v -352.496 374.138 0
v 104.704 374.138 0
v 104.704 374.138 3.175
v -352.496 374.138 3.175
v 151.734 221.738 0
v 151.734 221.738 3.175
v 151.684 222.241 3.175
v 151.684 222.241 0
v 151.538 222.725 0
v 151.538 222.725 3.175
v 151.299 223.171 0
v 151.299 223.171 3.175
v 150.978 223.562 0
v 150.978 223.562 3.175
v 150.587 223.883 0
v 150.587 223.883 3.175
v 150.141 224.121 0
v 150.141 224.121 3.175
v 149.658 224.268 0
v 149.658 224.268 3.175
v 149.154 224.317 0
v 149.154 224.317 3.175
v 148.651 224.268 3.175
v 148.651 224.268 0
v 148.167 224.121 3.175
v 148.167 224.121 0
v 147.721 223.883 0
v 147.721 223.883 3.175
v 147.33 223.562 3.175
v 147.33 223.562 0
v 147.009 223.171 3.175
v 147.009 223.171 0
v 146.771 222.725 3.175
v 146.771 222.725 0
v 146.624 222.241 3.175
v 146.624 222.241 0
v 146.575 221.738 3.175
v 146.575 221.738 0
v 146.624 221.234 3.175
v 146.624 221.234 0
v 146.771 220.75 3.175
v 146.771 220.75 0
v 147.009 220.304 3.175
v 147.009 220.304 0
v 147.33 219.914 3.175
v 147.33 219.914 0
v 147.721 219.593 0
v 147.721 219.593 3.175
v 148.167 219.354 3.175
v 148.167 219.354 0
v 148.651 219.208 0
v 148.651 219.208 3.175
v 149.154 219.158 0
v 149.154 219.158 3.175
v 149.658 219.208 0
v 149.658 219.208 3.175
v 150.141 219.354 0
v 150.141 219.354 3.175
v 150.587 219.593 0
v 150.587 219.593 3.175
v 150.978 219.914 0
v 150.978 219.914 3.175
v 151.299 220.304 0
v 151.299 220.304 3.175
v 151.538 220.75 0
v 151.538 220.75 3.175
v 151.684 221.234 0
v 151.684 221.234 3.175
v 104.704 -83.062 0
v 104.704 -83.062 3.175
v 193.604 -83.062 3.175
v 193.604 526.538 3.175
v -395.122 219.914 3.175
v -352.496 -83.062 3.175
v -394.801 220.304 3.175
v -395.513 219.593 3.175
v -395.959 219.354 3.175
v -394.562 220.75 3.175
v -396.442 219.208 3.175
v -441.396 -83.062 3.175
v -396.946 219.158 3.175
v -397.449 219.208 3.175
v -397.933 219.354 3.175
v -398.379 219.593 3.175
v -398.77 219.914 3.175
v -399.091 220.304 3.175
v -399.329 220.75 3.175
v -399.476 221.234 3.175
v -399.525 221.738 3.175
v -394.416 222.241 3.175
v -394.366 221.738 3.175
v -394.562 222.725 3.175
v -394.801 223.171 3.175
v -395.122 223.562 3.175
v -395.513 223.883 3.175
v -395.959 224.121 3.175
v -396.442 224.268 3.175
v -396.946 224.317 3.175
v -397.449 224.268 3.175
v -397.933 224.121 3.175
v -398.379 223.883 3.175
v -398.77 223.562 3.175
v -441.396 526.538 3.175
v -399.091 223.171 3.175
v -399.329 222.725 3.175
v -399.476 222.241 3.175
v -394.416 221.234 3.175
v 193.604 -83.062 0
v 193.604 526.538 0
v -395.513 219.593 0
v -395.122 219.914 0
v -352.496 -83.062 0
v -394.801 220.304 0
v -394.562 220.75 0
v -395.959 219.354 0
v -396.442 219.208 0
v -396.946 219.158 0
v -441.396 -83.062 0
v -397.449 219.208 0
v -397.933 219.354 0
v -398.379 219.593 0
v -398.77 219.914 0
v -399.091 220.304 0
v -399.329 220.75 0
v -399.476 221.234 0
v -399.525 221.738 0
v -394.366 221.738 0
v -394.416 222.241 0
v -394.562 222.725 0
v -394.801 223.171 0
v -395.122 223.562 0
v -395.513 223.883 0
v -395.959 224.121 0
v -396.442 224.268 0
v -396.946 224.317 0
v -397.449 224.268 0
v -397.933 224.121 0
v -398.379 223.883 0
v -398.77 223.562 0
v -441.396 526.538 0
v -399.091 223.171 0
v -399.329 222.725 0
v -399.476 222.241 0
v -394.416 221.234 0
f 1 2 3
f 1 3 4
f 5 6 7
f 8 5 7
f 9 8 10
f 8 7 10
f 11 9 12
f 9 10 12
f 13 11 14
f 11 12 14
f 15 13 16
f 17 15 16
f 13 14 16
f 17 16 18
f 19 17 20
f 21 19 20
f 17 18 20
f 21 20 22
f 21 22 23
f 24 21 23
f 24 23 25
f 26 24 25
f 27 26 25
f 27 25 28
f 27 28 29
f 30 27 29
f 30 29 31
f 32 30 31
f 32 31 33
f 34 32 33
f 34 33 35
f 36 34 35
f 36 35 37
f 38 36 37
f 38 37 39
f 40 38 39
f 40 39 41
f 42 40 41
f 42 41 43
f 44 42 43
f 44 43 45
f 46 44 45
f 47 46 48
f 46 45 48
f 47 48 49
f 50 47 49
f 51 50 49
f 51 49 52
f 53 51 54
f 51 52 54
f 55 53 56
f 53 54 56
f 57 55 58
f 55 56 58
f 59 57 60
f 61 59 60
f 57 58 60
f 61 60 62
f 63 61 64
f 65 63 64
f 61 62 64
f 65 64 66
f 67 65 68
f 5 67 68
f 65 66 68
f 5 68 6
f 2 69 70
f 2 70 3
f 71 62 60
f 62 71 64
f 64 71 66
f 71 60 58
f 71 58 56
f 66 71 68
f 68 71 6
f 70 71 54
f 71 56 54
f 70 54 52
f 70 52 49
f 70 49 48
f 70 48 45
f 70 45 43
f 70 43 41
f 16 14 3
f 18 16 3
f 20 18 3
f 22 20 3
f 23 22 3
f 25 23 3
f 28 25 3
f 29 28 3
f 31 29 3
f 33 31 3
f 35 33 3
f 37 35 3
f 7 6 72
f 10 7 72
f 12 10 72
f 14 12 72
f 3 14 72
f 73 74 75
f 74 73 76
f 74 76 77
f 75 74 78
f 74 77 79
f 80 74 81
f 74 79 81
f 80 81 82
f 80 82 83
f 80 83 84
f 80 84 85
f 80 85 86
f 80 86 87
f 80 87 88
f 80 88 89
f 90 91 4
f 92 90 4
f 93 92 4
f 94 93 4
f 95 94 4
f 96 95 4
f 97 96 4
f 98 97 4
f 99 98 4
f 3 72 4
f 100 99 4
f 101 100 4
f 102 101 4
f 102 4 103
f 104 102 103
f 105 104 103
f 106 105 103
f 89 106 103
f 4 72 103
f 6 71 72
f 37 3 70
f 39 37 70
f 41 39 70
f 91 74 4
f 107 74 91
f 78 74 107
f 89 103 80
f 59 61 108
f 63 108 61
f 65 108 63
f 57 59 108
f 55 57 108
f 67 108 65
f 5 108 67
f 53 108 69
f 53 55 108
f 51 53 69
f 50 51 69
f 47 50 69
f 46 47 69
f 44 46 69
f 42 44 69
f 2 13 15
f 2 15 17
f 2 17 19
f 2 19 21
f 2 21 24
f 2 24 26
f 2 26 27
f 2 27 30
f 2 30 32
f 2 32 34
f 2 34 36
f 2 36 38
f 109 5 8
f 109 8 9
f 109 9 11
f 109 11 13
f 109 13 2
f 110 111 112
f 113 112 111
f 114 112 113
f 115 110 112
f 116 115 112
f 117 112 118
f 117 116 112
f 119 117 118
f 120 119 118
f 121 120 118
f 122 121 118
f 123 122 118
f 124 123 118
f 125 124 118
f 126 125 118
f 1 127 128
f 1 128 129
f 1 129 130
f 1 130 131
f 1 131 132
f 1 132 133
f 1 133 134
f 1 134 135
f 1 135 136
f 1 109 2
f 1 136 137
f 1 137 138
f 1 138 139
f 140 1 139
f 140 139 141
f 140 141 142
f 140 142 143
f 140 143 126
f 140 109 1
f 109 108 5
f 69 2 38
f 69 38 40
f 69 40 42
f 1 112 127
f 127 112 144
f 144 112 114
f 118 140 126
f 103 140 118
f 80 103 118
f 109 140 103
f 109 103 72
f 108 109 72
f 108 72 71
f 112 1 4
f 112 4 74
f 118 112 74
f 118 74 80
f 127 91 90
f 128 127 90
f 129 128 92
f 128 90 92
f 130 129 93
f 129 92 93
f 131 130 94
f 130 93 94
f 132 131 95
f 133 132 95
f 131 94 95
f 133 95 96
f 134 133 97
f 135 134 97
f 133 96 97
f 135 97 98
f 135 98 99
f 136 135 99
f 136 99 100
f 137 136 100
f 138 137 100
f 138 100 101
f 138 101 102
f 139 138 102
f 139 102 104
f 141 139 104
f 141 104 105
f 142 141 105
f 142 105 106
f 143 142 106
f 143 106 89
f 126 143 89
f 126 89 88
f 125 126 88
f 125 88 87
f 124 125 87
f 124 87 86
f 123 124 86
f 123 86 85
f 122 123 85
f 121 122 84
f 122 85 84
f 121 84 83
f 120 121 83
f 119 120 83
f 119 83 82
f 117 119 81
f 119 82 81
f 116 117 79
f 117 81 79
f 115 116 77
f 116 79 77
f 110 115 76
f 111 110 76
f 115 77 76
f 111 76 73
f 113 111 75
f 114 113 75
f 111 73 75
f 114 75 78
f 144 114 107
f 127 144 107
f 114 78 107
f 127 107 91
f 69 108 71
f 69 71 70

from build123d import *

# Parameters (mm, degrees)
BOSS_EXTRUDE1_DEPTH = 3.175
SKETCH2_R           = 2.5796875
CUT_EXTRUDE1_DEPTH  = 4.175


with BuildPart() as part:
    # Sketch1 → Boss-Extrude1 (new body)
    with BuildSketch(Plane.XY):
        Polygon((-441.3957506, 526.537652812), (193.6042494, 526.537652812), (193.6042494, -83.062347188), (104.7042494, -83.062347188), (104.7042494, 374.137652812), (-352.4957506, 374.137652812), (-352.4957506, -83.062347188), (-441.3957506, -83.062347188), (-441.3957506, 36.485330073), align=None)
    extrude(amount=BOSS_EXTRUDE1_DEPTH)

    # Sketch2 → Cut-Extrude1 (cut, through all)
    with BuildSketch(Plane.XY.offset(3.175)):
        with Locations((-396.9457506, 221.737652812)):
            Circle(SKETCH2_R)
        with Locations((149.1542494, 221.737652812)):
            Circle(SKETCH2_R)
    extrude(amount=-CUT_EXTRUDE1_DEPTH, mode=Mode.SUBTRACT)


solid = part.part
